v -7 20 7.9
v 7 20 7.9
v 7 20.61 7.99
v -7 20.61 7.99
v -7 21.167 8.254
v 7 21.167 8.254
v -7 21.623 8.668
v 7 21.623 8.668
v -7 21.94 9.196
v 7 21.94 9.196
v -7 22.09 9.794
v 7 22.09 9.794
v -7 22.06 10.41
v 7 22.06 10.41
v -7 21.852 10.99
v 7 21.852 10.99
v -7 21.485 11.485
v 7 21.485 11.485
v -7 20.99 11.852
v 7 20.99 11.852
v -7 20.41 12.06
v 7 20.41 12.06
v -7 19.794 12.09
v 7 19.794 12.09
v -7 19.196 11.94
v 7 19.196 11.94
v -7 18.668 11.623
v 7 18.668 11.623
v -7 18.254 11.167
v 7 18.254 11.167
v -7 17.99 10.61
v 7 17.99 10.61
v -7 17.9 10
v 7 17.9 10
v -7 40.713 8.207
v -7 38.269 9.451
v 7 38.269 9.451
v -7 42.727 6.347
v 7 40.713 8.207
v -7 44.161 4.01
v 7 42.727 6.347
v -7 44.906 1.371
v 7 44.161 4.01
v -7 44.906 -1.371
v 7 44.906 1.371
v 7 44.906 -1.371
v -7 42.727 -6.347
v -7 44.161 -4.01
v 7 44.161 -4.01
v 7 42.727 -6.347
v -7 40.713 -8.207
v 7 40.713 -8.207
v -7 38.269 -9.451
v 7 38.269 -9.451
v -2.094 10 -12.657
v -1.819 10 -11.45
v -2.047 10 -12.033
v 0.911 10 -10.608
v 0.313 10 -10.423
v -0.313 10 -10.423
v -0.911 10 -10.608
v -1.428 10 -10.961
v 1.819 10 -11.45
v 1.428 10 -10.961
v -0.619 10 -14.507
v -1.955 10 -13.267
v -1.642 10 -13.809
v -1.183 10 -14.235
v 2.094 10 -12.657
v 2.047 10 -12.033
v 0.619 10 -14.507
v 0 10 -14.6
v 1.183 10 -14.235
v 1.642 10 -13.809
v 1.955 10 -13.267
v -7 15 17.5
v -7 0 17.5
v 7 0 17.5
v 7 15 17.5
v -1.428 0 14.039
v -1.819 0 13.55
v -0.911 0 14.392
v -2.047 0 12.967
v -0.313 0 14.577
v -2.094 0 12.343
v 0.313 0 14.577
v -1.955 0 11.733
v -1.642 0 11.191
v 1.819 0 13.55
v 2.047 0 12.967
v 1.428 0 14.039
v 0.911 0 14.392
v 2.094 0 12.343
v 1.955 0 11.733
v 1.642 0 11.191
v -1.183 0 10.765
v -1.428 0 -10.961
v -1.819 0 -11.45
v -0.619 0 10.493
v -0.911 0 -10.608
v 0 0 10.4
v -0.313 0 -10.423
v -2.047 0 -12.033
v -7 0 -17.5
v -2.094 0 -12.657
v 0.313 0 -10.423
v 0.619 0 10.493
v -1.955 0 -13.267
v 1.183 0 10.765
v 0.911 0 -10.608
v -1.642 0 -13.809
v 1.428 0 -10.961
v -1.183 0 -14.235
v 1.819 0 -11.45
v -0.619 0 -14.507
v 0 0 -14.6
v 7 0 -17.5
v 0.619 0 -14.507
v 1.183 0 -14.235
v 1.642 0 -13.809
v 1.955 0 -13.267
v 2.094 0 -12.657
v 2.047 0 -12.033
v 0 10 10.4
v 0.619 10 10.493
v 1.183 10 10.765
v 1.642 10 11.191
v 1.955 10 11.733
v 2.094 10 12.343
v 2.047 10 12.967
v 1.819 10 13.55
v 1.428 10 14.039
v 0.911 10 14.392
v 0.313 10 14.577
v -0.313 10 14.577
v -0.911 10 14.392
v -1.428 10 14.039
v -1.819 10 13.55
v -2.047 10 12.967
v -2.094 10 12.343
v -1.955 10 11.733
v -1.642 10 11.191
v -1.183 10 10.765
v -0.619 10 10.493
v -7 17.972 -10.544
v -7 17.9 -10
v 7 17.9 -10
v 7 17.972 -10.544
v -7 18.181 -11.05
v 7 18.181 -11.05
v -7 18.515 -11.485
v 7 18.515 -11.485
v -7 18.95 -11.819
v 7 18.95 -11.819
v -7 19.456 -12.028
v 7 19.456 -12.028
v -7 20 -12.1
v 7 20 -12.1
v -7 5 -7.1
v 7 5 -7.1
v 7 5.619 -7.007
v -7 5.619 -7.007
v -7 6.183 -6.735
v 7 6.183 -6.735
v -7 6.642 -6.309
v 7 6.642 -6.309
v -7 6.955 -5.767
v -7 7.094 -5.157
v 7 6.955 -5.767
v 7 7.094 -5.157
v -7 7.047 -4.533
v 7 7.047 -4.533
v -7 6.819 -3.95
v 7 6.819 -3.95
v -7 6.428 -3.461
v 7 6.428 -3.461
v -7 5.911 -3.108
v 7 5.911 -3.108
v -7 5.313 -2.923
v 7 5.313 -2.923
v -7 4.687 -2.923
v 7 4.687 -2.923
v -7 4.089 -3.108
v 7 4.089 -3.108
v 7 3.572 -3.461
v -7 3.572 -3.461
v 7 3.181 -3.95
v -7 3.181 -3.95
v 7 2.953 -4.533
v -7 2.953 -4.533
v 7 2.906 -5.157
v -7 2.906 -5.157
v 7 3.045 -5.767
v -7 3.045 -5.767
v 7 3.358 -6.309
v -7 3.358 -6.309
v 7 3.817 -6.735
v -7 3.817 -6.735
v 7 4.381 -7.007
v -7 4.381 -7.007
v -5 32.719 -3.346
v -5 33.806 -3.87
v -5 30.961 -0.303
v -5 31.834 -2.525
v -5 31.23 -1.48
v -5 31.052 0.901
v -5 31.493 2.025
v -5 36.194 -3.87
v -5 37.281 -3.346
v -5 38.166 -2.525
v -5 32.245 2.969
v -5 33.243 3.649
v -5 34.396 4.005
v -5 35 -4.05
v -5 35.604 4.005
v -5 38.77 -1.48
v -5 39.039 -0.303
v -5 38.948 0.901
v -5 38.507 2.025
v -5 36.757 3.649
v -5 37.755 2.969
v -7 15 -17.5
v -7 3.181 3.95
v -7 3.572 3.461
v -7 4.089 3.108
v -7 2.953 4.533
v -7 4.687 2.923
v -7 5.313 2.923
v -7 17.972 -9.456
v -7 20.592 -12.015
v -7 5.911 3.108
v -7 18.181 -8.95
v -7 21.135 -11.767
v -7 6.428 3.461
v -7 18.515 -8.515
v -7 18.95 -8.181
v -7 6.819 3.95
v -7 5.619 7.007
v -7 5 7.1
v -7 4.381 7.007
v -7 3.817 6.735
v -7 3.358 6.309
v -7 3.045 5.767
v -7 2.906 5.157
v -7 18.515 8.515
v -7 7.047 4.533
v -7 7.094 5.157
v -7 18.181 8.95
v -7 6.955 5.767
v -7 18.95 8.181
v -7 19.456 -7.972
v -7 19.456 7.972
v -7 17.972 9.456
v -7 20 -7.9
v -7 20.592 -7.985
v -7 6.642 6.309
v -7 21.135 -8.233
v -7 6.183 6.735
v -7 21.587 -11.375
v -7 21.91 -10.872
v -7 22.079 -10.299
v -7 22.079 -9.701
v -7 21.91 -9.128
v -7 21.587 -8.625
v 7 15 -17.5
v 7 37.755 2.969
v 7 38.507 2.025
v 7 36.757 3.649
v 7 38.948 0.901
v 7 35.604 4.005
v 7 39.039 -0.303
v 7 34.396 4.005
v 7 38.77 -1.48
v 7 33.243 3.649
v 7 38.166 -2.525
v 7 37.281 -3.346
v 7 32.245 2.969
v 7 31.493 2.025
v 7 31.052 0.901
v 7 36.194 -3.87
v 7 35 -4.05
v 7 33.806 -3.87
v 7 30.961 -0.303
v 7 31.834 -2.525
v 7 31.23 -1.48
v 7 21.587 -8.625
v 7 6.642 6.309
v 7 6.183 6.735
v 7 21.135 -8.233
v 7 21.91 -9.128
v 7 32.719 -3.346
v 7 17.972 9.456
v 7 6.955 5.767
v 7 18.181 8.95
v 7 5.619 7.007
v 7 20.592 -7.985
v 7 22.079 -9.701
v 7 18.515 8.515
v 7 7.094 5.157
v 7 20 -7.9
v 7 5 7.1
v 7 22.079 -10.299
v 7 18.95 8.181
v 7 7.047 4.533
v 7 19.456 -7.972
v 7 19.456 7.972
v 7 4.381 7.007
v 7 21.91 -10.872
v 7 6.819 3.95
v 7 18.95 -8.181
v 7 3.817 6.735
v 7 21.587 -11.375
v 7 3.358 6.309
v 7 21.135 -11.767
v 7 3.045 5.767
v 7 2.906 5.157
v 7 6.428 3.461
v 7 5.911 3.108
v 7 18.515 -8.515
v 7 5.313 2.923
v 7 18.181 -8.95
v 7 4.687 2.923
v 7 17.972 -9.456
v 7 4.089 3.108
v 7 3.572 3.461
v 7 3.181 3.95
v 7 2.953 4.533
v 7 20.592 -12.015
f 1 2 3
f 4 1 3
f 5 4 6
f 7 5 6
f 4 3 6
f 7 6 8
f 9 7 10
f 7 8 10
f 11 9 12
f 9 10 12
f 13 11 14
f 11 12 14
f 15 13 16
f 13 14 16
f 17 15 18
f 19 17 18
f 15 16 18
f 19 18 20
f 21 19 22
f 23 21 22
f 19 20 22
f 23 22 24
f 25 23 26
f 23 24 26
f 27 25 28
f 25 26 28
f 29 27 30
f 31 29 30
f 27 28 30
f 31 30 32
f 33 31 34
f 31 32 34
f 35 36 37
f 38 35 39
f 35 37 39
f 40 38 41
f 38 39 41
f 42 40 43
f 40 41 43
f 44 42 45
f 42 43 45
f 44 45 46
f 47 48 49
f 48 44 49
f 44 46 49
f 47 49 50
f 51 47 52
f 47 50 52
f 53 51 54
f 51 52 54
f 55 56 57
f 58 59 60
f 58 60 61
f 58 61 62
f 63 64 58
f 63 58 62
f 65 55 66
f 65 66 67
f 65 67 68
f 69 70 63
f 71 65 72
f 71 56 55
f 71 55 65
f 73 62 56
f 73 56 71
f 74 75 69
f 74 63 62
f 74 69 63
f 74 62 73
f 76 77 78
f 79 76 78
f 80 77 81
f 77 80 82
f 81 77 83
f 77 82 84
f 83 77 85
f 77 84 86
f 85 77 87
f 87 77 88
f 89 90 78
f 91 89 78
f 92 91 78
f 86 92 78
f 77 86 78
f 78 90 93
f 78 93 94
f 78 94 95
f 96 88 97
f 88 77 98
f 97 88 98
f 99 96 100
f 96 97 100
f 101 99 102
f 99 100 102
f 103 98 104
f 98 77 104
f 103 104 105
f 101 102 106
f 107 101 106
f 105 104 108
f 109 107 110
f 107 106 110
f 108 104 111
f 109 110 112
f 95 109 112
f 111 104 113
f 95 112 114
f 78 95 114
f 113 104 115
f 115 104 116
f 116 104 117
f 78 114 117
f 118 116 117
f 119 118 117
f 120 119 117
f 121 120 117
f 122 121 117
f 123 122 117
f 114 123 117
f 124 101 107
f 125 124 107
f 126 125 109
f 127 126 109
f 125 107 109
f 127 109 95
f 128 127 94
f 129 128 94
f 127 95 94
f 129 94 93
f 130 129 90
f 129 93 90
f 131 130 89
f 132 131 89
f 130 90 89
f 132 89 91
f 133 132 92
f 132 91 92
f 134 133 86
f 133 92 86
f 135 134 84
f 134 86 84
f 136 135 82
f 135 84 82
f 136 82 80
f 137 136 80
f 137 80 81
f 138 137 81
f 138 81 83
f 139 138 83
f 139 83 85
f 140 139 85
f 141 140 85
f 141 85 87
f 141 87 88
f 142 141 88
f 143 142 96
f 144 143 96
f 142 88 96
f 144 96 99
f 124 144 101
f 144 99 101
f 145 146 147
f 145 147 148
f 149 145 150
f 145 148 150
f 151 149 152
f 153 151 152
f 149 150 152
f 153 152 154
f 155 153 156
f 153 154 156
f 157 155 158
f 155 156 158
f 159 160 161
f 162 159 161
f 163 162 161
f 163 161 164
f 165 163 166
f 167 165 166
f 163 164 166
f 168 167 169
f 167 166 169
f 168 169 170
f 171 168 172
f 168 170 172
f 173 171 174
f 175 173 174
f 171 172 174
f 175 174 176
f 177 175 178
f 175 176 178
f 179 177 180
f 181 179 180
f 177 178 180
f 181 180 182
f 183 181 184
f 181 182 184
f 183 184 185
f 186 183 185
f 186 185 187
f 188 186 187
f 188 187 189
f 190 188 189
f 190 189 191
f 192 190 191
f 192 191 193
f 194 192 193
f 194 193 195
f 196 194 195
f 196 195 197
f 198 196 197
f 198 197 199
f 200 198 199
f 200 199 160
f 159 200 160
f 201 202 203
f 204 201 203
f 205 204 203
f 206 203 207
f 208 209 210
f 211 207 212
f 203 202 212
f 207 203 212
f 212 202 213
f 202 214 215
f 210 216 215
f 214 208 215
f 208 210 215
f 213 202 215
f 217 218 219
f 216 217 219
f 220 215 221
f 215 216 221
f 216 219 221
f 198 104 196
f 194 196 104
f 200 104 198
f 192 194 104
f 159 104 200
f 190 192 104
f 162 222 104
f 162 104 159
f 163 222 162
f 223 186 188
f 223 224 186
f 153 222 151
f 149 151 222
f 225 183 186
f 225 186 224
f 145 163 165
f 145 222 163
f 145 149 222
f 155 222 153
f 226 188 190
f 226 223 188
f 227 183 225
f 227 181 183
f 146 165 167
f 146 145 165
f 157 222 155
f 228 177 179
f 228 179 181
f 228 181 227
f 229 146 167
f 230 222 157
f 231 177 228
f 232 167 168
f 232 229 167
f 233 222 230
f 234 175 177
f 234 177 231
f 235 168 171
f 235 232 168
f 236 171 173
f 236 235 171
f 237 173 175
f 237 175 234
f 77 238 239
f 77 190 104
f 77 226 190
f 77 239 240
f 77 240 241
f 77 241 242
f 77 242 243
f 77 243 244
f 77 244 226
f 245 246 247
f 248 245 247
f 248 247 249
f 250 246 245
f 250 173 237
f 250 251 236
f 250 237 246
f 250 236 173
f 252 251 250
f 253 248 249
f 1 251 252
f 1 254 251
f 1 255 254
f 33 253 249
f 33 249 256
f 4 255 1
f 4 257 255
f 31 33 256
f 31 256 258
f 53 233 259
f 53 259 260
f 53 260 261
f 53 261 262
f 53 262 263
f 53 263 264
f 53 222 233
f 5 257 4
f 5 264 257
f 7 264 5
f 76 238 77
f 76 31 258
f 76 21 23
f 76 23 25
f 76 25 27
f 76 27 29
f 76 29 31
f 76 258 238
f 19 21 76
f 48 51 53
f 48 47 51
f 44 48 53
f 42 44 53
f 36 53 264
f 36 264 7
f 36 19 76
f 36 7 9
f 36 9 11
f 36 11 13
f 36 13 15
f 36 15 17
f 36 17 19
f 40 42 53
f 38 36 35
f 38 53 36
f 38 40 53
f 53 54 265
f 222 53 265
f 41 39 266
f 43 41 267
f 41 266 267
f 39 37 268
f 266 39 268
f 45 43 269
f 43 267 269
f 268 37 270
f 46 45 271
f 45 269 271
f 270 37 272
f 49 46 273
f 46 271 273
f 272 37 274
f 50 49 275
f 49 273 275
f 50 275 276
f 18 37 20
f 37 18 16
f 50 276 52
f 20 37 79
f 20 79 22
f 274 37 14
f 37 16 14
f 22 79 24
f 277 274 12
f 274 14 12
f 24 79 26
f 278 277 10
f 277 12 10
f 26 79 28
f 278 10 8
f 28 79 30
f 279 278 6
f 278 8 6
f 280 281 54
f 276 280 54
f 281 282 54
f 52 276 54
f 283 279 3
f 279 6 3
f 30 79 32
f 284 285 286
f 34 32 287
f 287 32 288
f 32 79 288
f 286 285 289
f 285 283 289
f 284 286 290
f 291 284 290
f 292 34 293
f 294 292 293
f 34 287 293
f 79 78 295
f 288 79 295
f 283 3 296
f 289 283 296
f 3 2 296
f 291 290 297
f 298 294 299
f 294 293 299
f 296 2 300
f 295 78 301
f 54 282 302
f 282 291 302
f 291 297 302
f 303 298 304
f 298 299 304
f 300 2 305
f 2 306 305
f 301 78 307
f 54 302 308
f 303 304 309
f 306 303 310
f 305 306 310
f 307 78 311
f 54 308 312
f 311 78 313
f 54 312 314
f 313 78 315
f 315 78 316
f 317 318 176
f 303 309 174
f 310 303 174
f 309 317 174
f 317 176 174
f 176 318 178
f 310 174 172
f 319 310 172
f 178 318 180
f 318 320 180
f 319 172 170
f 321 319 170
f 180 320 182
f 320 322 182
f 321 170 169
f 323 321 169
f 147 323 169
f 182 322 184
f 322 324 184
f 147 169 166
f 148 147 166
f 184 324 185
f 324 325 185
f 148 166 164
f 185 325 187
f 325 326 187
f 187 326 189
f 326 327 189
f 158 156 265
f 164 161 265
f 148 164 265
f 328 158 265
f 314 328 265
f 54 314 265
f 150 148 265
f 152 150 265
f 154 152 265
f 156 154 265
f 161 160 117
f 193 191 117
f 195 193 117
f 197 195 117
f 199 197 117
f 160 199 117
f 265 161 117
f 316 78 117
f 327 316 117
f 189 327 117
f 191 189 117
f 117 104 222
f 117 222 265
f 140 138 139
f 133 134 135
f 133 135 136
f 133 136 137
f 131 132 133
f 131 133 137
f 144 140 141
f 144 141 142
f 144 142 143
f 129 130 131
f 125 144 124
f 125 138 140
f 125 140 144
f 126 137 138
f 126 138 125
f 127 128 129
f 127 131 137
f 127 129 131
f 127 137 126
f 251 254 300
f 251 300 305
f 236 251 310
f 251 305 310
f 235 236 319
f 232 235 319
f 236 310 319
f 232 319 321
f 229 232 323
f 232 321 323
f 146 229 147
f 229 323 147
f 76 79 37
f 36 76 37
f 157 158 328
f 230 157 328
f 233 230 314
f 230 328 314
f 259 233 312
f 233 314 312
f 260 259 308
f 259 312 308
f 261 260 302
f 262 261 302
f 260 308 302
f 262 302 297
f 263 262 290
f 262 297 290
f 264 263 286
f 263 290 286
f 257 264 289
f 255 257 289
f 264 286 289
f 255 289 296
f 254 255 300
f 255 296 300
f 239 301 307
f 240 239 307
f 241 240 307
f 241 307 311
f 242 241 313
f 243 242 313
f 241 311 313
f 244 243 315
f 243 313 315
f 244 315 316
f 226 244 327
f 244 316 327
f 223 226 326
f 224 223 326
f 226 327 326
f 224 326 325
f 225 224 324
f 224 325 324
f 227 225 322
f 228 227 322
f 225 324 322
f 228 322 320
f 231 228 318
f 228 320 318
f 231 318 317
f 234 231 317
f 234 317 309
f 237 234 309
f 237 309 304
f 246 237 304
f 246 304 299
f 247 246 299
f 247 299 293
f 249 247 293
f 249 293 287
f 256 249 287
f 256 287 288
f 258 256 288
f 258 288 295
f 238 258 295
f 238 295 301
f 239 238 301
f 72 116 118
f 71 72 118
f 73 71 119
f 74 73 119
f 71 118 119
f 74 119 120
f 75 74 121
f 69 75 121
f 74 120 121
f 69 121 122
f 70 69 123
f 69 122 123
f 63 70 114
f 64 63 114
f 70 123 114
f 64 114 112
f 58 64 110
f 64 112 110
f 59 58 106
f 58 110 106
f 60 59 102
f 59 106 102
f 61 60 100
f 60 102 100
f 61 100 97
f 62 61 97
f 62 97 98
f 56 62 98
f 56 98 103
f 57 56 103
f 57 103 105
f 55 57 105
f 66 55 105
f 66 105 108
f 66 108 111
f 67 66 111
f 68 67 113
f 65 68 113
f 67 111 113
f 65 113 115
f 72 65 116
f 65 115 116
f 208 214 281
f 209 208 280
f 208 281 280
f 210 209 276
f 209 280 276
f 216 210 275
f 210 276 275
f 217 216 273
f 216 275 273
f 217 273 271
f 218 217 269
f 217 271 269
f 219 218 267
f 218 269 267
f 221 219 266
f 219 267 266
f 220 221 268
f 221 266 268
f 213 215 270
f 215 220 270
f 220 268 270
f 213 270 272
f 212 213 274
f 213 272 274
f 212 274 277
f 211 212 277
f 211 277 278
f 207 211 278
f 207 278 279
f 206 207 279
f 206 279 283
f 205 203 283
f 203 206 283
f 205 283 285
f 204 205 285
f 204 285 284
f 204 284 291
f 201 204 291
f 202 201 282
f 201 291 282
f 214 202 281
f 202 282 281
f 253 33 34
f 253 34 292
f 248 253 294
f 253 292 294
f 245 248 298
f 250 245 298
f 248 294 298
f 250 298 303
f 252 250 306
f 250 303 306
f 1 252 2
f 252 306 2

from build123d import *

# Parameters (mm, degrees)
SKETCH_1_W          = 14
SKETCH_1_H          = 35
EXTRUDE_1_DEPTH     = 60
CUT_EXTRUDE_1_DEPTH = 60
SKETCH_3_R          = 2.1
CUT_EXTRUDE_2_DEPTH = 10
SKETCH_4_R          = 4.05
CUT_EXTRUDE_3_DEPTH = 46
CUT_EXTRUDE_4_DEPTH = 100
SKETCH_7_R          = 4.05
EXTRUDE_3_DEPTH     = 2


with BuildPart() as part:
    # 草图1 → 凸台-拉伸1 (new body)
    with BuildSketch(Plane(origin=(0, 0, 0), x_dir=(1, 0, 0), z_dir=(0, 1, 0))):
        Rectangle(SKETCH_1_W, SKETCH_1_H)
    extrude(amount=EXTRUDE_1_DEPTH)

    # 草图2 → 切除-拉伸1 (cut)
    with BuildSketch(Plane(origin=(7, 0, 0), x_dir=(0, 0, -1), z_dir=(1, 0, 0))):
        with BuildLine():
            Line((-17.5, 15), (-9.450519182, 38.269202838))
            ThreePointArc((-9.450519182, 38.269202838), (-5.87e-07, 45), (9.450518798, 38.269203948))
            Line((9.450518798, 38.269203948), (17.5, 15))
            Line((17.5, 15), (17.5, 60))
            Line((17.5, 60), (-17.5, 60))
            Line((-17.5, 60), (-17.5, 15))
        make_face()
    extrude(amount=-CUT_EXTRUDE_1_DEPTH, mode=Mode.SUBTRACT)

    # 草图3 → 切除-拉伸2 (cut)
    with BuildSketch(Plane.XZ):
        with Locations(Location((0, -12.5, 0), (0, 0, 270))):
            Circle(SKETCH_3_R)
        with Locations(Location((0, 12.5, 0), (0, 0, 270))):
            Circle(SKETCH_3_R)
    extrude(amount=-CUT_EXTRUDE_2_DEPTH, mode=Mode.SUBTRACT)

    # 草图4 → 切除-拉伸3 (cut)
    with BuildSketch(Plane(origin=(7, 0, 0), x_dir=(0, 0, -1), z_dir=(1, 0, 0))):
        with Locations((0, 35)):
            Circle(SKETCH_4_R)
    extrude(amount=-CUT_EXTRUDE_3_DEPTH, mode=Mode.SUBTRACT)

    # 草图5 → 切除-拉伸4 (cut)
    with BuildSketch(Plane(origin=(7, 0, 0), x_dir=(0, 0, -1), z_dir=(1, 0, 0))):
        with BuildLine():
            ThreePointArc((-7.9, 20), (-11.48492424, 21.48492424), (-10, 17.9))
            Line((-10, 17.9), (-10, 20))
            Line((-10, 20), (-7.9, 20))
        make_face()
        with BuildLine():
            Line((-10, 20), (-10, 17.9))
            ThreePointArc((-10, 17.9), (-8.51507576, 18.51507576), (-7.9, 20))
            Line((-7.9, 20), (-10, 20))
        make_face()
        with BuildLine():
            ThreePointArc((-7.9, 20), (-11.48492424, 21.48492424), (-10, 17.9))
            Line((-10, 17.9), (-10, 20))
            Line((-10, 20), (-7.9, 20))
        make_face()
        with BuildLine():
            Line((-10, 20), (-10, 17.9))
            ThreePointArc((-10, 17.9), (-8.51507576, 18.51507576), (-7.9, 20))
            Line((-7.9, 20), (-10, 20))
        make_face()
        with BuildLine():
            ThreePointArc((7.9, 20), (8.51507576, 18.51507576), (10, 17.9))
            Line((10, 17.9), (10, 20))
            Line((10, 20), (7.9, 20))
        make_face()
        with BuildLine():
            Line((10, 20), (10, 17.9))
            ThreePointArc((10, 17.9), (11.48492424, 18.51507576), (12.1, 20))
            ThreePointArc((12.1, 20), (10, 22.1), (7.9, 20))
            Line((7.9, 20), (10, 20))
        make_face()
        with BuildLine():
            ThreePointArc((7.9, 20), (8.51507576, 18.51507576), (10, 17.9))
            Line((10, 17.9), (10, 20))
            Line((10, 20), (7.9, 20))
        make_face()
        with BuildLine():
            Line((10, 20), (10, 17.9))
            ThreePointArc((10, 17.9), (11.48492424, 18.51507576), (12.1, 20))
            ThreePointArc((12.1, 20), (10, 22.1), (7.9, 20))
            Line((7.9, 20), (10, 20))
        make_face()
        with BuildLine():
            ThreePointArc((2.9, 5), (5, 2.9), (7.1, 5))
            Line((7.1, 5), (2.9, 5))
        make_face()
        with BuildLine():
            Line((2.9, 5), (7.1, 5))
            ThreePointArc((7.1, 5), (5, 7.1), (2.9, 5))
        make_face()
        with BuildLine():
            ThreePointArc((2.9, 5), (5, 2.9), (7.1, 5))
            Line((7.1, 5), (2.9, 5))
        make_face()
        with BuildLine():
            Line((2.9, 5), (7.1, 5))
            ThreePointArc((7.1, 5), (5, 7.1), (2.9, 5))
        make_face()
        with BuildLine():
            ThreePointArc((-2.9, 5), (-5, 7.1), (-7.1, 5))
            Line((-7.1, 5), (-2.9, 5))
        make_face()
        with BuildLine():
            Line((-2.9, 5), (-7.1, 5))
            ThreePointArc((-7.1, 5), (-5, 2.9), (-2.9, 5))
        make_face()
        with BuildLine():
            ThreePointArc((-2.9, 5), (-5, 7.1), (-7.1, 5))
            Line((-7.1, 5), (-2.9, 5))
        make_face()
        with BuildLine():
            Line((-2.9, 5), (-7.1, 5))
            ThreePointArc((-7.1, 5), (-5, 2.9), (-2.9, 5))
        make_face()
    extrude(amount=-CUT_EXTRUDE_4_DEPTH, mode=Mode.SUBTRACT)


with BuildPart() as body_2:
    # 草图7 → 凸台-拉伸3 (new body)
    with BuildSketch(Plane.ZY.offset(7)):
        with Locations((0, 35)):
            Circle(SKETCH_7_R)
    extrude(amount=-EXTRUDE_3_DEPTH)


with BuildPart() as part_1:
    add(part.part)

    # Combine 1: union body 2
    add(body_2.part)


solid = part_1.part
